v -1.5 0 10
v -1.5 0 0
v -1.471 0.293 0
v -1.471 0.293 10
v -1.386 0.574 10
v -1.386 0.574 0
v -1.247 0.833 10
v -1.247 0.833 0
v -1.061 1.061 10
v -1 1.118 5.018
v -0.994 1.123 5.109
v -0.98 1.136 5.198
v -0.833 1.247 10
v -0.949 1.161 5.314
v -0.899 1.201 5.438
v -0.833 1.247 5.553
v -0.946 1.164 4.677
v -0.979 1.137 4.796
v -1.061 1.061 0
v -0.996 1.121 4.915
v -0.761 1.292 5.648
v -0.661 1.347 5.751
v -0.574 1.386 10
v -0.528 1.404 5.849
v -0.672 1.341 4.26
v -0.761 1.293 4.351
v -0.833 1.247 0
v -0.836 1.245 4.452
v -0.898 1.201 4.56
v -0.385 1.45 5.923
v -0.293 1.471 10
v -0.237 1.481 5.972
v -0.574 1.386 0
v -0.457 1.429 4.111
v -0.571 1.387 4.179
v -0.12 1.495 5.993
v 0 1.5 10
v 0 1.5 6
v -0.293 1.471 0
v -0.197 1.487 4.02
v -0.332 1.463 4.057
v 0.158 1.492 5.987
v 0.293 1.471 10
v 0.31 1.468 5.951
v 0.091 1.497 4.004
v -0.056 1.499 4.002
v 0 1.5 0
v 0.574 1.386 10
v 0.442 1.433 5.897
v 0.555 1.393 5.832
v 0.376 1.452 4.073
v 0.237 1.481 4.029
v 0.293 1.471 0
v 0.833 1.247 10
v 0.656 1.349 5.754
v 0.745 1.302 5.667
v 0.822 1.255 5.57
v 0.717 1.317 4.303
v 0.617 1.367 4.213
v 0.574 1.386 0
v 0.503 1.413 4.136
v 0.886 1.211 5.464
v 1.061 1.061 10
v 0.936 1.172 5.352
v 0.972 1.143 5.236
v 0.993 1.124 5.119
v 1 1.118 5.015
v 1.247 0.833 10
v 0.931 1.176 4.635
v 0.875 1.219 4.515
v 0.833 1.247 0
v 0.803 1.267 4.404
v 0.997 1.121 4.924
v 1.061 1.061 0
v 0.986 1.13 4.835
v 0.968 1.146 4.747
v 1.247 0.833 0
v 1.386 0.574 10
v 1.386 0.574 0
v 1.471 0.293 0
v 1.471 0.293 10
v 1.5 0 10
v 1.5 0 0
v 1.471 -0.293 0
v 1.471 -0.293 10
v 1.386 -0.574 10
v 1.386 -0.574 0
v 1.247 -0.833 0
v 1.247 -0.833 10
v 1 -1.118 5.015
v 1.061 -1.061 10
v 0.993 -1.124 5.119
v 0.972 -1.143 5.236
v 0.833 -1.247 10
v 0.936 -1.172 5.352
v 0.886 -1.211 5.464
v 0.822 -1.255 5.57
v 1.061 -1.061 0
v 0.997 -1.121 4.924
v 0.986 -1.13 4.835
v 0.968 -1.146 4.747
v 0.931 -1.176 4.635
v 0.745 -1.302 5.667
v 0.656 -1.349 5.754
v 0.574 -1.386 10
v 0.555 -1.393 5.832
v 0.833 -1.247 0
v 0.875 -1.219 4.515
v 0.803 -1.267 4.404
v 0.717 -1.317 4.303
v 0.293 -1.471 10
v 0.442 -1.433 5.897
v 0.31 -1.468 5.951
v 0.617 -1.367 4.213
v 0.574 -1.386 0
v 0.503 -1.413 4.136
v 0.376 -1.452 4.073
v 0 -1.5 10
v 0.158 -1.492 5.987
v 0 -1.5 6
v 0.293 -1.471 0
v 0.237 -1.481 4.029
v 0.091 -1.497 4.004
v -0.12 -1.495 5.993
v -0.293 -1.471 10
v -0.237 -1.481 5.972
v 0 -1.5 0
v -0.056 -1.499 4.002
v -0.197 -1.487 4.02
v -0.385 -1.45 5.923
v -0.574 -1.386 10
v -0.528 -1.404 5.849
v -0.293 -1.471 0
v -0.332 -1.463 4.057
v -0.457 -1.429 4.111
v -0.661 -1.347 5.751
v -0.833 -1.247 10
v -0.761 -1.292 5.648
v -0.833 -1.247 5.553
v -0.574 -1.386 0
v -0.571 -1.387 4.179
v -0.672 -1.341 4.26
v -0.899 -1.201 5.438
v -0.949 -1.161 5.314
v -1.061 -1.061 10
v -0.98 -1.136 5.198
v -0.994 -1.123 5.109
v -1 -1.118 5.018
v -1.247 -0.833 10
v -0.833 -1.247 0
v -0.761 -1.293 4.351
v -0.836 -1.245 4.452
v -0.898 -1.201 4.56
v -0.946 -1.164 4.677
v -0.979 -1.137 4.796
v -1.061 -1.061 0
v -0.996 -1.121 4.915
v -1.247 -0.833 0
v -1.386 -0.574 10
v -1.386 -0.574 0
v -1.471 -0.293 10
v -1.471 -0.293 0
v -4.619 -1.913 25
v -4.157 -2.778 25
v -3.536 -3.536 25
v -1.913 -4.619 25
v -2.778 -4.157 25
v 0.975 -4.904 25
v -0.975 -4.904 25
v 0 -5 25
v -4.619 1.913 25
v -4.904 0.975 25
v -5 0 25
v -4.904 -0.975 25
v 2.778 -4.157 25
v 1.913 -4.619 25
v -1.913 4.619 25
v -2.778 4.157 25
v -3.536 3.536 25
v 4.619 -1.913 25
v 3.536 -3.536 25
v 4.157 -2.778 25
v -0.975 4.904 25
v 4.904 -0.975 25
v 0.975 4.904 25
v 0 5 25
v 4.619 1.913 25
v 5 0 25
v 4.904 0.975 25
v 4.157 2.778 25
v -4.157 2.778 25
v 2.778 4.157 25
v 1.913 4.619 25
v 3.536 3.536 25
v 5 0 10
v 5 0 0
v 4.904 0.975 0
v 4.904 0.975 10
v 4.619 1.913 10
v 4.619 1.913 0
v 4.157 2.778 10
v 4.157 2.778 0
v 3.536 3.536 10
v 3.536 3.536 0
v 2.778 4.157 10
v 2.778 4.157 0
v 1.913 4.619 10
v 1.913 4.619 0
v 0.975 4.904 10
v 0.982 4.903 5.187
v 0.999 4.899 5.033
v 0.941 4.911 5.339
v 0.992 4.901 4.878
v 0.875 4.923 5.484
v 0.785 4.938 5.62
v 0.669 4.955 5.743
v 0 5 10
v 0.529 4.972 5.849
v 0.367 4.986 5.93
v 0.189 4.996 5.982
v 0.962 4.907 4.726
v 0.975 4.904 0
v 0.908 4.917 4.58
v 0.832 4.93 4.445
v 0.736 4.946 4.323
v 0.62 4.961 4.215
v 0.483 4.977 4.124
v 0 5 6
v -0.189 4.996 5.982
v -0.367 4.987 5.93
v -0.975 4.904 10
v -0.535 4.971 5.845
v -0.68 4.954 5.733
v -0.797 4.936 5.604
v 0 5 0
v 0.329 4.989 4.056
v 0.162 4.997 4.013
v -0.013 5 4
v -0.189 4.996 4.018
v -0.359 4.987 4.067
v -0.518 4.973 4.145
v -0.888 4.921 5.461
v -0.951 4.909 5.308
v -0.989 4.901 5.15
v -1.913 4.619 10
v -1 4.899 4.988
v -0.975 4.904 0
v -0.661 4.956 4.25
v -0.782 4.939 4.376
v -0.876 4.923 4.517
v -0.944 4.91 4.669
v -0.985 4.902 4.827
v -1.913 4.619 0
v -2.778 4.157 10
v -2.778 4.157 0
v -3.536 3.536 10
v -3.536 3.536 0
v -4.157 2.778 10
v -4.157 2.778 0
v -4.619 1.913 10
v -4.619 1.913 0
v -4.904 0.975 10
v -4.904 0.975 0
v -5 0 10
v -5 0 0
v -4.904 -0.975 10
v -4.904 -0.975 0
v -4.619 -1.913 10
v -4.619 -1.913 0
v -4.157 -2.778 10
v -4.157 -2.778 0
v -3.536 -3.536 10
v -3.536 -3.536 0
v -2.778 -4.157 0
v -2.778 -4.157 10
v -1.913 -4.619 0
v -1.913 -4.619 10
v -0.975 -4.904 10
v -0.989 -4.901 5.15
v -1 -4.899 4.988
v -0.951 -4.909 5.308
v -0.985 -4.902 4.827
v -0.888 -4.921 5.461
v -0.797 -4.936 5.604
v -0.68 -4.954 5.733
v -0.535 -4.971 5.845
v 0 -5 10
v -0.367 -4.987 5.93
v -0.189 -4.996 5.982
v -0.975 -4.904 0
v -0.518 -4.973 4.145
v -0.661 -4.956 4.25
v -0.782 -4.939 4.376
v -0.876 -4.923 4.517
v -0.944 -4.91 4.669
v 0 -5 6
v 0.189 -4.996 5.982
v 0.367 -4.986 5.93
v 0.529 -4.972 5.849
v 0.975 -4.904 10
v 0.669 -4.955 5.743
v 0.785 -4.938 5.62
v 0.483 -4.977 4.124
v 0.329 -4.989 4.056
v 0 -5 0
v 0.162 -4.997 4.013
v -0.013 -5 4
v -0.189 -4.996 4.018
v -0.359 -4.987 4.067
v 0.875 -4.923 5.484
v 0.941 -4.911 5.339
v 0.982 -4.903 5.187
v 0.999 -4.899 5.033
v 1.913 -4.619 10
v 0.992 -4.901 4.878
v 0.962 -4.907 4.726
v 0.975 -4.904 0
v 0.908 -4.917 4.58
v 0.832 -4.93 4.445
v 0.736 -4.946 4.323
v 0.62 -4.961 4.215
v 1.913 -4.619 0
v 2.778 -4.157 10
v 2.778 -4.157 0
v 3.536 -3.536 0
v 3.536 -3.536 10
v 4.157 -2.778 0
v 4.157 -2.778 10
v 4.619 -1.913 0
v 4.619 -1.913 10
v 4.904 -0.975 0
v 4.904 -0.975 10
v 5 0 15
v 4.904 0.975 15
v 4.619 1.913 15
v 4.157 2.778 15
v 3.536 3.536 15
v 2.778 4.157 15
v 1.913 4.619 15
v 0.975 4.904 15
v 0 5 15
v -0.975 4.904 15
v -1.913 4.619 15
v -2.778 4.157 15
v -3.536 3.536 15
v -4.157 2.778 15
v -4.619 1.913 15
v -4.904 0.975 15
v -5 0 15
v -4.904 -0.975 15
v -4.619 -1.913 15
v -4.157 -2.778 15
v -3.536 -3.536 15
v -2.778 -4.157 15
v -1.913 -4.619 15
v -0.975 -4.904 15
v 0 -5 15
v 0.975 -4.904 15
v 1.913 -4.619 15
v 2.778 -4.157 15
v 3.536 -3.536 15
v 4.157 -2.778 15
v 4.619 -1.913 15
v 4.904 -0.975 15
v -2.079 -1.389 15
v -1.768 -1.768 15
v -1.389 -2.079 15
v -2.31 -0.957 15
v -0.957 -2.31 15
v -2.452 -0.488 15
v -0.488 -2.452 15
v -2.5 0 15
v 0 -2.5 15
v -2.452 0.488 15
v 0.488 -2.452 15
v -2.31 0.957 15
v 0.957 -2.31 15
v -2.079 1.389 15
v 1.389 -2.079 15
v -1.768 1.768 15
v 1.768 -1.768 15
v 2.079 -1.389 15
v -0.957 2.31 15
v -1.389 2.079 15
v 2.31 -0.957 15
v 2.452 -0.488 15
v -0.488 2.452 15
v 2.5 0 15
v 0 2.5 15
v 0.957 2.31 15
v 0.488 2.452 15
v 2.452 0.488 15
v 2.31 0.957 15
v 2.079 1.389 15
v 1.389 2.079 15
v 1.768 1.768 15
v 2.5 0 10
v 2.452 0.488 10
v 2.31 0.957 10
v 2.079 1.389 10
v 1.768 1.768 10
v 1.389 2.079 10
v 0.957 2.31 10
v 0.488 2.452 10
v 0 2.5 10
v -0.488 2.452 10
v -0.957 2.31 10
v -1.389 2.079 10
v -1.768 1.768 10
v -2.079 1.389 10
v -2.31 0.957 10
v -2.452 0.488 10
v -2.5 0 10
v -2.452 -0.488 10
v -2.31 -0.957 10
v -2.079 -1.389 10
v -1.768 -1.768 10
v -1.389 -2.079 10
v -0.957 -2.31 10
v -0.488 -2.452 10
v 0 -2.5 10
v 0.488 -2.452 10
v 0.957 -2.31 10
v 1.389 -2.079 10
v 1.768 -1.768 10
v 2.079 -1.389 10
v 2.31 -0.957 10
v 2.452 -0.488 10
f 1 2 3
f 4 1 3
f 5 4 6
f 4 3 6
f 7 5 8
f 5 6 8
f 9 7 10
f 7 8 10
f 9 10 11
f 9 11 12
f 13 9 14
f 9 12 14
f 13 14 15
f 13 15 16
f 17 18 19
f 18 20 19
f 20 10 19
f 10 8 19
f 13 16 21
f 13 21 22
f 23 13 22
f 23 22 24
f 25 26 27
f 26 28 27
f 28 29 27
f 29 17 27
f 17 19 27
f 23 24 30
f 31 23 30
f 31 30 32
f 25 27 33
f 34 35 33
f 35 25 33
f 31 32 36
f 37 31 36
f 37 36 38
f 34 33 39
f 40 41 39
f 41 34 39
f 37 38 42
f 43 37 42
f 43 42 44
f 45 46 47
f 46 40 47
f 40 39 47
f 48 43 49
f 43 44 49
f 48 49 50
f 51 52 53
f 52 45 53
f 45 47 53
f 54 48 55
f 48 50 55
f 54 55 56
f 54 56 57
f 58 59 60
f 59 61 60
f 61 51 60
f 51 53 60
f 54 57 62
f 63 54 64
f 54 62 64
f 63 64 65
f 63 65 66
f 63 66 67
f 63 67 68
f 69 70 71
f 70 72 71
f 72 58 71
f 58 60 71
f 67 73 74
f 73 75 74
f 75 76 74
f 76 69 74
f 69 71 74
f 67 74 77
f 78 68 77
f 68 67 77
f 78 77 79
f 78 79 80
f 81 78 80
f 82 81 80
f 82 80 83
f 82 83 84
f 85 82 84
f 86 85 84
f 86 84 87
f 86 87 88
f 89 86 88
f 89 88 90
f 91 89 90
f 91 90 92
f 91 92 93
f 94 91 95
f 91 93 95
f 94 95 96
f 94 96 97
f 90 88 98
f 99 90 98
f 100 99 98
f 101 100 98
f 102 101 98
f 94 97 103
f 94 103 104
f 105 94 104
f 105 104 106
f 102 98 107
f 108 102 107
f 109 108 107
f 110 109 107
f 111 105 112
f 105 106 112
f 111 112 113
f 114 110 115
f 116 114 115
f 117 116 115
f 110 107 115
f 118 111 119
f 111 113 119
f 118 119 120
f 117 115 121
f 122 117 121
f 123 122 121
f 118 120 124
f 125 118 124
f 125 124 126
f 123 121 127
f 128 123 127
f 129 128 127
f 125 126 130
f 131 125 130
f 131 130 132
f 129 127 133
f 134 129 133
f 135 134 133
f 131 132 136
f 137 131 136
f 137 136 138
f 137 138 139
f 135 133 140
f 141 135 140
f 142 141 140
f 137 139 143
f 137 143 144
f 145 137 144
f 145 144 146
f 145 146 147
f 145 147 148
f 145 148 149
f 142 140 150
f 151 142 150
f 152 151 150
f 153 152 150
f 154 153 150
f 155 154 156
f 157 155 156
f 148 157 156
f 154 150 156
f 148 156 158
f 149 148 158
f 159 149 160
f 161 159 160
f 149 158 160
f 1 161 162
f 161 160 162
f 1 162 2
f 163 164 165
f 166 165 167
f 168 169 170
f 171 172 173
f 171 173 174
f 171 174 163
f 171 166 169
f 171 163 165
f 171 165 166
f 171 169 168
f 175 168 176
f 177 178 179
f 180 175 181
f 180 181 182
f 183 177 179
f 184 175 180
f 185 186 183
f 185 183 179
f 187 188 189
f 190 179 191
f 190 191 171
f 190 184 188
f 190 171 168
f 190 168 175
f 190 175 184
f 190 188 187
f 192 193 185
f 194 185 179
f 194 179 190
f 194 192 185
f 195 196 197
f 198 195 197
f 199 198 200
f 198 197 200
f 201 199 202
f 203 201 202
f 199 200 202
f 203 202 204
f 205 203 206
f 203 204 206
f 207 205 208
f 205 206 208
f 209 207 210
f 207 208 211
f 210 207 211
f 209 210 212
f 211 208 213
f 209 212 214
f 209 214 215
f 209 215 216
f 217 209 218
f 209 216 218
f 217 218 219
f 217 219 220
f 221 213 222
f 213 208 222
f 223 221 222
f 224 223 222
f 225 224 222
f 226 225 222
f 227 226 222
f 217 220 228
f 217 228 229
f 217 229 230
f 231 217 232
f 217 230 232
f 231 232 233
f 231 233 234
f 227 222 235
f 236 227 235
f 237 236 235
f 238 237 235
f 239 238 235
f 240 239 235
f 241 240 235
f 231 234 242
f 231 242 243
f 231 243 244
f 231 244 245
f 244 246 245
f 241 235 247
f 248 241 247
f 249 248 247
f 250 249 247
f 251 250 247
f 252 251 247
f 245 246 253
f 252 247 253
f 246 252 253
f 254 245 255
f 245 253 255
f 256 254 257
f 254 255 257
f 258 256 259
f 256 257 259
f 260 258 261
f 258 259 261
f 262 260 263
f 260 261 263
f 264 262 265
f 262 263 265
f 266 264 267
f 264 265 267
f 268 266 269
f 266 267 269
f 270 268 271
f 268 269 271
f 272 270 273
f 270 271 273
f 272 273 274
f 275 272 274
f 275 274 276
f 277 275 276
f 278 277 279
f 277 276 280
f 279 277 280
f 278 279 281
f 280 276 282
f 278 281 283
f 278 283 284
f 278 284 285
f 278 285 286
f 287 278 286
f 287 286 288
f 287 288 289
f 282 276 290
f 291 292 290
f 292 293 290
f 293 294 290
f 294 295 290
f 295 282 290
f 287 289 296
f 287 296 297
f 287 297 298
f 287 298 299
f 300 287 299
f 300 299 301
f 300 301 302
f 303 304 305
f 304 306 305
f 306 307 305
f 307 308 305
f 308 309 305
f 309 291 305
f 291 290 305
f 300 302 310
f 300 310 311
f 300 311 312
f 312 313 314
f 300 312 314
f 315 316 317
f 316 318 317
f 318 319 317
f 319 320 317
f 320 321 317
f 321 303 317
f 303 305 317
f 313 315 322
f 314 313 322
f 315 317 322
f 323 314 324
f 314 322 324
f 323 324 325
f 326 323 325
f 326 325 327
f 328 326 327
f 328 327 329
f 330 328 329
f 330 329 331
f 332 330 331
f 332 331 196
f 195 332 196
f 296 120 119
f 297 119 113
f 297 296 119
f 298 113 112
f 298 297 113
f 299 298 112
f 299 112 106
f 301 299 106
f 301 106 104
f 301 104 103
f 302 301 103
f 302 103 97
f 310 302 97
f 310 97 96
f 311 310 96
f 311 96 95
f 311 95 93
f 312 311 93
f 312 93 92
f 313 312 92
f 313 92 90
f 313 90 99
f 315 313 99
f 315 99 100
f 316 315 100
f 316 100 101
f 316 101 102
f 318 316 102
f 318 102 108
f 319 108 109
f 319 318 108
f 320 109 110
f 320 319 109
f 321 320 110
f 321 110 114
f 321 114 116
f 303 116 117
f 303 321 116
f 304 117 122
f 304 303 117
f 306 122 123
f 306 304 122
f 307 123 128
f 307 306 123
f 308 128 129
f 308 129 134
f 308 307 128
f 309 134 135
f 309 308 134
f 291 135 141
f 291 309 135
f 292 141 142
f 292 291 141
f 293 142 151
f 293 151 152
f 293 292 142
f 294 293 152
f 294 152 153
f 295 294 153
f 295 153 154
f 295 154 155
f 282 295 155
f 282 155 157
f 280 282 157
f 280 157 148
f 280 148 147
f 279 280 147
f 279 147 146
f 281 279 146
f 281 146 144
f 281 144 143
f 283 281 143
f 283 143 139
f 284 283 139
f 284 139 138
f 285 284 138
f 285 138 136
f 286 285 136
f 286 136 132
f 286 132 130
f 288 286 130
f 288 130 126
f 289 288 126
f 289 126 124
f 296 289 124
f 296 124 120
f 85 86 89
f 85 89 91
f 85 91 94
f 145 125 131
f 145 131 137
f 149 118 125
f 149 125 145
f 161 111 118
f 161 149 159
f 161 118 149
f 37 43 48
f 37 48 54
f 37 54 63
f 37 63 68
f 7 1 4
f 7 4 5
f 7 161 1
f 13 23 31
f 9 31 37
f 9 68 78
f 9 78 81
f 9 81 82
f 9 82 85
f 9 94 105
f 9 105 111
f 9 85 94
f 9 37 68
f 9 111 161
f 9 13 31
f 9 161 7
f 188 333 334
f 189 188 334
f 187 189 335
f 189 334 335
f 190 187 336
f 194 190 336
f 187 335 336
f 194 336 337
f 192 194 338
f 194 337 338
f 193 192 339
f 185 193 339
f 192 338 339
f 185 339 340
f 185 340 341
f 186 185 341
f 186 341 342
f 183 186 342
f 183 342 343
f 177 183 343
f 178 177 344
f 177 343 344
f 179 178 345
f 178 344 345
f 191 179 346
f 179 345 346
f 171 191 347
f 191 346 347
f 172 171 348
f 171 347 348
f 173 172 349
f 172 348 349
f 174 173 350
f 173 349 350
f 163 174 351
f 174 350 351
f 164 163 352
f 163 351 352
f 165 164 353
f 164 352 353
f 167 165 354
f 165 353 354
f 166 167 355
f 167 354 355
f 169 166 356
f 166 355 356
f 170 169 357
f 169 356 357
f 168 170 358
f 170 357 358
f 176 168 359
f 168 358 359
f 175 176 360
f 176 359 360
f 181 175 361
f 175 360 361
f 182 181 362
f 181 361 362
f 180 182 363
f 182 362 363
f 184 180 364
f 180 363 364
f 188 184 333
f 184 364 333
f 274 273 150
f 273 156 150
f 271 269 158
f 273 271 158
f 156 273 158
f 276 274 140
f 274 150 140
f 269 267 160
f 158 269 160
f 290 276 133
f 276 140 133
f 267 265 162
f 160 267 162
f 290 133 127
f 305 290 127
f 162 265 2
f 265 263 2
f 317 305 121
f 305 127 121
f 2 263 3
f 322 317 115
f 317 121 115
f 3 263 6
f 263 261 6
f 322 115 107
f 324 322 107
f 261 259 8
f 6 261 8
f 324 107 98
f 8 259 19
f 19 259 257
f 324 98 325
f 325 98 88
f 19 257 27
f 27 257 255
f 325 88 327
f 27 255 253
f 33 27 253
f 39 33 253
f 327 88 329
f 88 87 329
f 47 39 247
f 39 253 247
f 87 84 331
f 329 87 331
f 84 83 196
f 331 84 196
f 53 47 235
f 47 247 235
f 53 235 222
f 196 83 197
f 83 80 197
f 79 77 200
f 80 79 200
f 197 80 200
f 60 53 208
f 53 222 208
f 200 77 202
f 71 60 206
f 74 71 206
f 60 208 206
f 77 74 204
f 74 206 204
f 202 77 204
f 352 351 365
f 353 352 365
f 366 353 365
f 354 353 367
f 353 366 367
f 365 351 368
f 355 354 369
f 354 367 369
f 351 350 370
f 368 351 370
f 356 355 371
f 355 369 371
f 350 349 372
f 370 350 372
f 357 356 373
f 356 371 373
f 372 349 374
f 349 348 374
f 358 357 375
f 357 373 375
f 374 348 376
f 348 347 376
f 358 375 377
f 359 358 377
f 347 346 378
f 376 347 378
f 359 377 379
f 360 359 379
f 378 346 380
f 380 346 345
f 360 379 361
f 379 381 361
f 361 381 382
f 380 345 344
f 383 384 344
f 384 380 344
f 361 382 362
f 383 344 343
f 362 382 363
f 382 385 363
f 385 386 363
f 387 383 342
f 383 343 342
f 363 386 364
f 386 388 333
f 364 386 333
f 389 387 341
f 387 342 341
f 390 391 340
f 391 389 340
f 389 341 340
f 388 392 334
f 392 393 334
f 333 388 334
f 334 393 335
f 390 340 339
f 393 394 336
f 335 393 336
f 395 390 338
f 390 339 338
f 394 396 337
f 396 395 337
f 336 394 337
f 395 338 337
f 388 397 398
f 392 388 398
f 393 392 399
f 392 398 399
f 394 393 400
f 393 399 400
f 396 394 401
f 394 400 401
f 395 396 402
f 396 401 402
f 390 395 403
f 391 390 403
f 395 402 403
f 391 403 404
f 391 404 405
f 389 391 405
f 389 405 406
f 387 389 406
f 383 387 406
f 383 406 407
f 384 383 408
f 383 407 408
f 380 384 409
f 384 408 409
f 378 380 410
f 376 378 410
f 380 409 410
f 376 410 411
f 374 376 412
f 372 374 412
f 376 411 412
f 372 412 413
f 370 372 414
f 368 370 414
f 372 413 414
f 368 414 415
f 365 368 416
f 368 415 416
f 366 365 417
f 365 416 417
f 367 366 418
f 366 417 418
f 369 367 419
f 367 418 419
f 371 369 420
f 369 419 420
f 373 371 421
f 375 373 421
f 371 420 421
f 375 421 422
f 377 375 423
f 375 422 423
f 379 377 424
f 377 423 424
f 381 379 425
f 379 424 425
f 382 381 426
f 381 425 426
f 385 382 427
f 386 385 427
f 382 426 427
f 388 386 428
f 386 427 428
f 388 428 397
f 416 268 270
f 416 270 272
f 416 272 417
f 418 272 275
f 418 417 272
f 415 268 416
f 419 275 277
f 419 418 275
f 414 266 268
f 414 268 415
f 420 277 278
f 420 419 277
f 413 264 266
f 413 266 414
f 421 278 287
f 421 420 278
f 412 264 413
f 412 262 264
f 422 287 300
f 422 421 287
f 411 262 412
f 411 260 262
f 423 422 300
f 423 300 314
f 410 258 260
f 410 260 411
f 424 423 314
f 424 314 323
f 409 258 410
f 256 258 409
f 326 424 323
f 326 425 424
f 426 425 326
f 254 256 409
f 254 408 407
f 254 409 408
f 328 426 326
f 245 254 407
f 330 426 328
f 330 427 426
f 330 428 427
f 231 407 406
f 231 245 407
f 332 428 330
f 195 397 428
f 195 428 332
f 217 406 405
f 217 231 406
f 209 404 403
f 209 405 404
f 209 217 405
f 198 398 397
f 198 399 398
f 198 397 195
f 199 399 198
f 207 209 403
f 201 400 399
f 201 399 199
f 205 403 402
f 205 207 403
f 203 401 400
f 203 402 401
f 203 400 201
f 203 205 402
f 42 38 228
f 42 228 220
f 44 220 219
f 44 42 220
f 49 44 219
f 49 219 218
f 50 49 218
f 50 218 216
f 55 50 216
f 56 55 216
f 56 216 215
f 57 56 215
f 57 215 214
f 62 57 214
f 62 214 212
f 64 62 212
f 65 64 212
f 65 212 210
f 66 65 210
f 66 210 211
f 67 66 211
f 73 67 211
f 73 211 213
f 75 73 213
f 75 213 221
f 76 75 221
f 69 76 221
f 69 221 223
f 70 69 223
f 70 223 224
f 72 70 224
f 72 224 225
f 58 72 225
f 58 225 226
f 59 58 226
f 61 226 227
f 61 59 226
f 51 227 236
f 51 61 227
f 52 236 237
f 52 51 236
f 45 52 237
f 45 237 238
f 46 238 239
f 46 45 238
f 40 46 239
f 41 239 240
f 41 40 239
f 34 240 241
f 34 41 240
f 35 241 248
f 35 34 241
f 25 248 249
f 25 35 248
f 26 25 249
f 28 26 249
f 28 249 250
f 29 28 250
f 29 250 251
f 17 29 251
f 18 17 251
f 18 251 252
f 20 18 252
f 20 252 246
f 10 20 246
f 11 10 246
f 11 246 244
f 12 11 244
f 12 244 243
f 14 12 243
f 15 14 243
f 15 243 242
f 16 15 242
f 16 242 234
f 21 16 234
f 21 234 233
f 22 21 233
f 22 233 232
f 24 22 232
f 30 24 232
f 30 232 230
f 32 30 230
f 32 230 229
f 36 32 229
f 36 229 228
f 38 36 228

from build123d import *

# Parameters (mm, degrees)
ESQUISSE1_R                  = 5
BOSS_EXTRU_1_DEPTH           = 10
ESQUISSE2_R                  = 2.5
BOSS_EXTRU_2_DEPTH           = 5
ESQUISSE3_R                  = 5
BOSS_EXTRU_4_DEPTH           = 10
ESQUISSE4_R                  = 1.5
ENL_V_MAT_EXTRU_1_DEPTH      = 10
ENL_V_MAT_EXTRU_2_DEPTH      = 10
ENL_V_MAT_EXTRU_2_DEPTH_BACK = 10
ESQUISSE5_R                  = 1


with BuildPart() as part:
    # Esquisse1 → Boss.-Extru.1 (new body)
    with BuildSketch(Plane.XY):
        Circle(ESQUISSE1_R)
    extrude(amount=BOSS_EXTRU_1_DEPTH)

    # Esquisse2 → Boss.-Extru.2 (add)
    with BuildSketch(Plane.XY.offset(10)):
        Circle(ESQUISSE2_R)
    extrude(amount=BOSS_EXTRU_2_DEPTH)

    # Esquisse3 → Boss.-Extru.4 (add)
    with BuildSketch(Plane.XY.offset(15)):
        Circle(ESQUISSE3_R)
    extrude(amount=BOSS_EXTRU_4_DEPTH)

    # Esquisse4 → Enlèv. mat.-Extru.1 (cut)
    with BuildSketch(Plane(origin=(0, 0, 0), x_dir=(-1, 0, 0), z_dir=(0, 0, -1))):
        Circle(ESQUISSE4_R)
    extrude(amount=-ENL_V_MAT_EXTRU_1_DEPTH, mode=Mode.SUBTRACT)

    # Esquisse5 → Enlèv. mat.-Extru.2 (cut, two sides: drawn at the far end of the back side and taken through both)
    with BuildSketch(Plane(origin=(0, 0, 0), x_dir=(1, 0, 0), z_dir=(0, 1, 0)).offset(-ENL_V_MAT_EXTRU_2_DEPTH_BACK)):
        with Locations((0, -5)):
            Circle(ESQUISSE5_R)
    extrude(amount=ENL_V_MAT_EXTRU_2_DEPTH + ENL_V_MAT_EXTRU_2_DEPTH_BACK, mode=Mode.SUBTRACT)


solid = part.part
